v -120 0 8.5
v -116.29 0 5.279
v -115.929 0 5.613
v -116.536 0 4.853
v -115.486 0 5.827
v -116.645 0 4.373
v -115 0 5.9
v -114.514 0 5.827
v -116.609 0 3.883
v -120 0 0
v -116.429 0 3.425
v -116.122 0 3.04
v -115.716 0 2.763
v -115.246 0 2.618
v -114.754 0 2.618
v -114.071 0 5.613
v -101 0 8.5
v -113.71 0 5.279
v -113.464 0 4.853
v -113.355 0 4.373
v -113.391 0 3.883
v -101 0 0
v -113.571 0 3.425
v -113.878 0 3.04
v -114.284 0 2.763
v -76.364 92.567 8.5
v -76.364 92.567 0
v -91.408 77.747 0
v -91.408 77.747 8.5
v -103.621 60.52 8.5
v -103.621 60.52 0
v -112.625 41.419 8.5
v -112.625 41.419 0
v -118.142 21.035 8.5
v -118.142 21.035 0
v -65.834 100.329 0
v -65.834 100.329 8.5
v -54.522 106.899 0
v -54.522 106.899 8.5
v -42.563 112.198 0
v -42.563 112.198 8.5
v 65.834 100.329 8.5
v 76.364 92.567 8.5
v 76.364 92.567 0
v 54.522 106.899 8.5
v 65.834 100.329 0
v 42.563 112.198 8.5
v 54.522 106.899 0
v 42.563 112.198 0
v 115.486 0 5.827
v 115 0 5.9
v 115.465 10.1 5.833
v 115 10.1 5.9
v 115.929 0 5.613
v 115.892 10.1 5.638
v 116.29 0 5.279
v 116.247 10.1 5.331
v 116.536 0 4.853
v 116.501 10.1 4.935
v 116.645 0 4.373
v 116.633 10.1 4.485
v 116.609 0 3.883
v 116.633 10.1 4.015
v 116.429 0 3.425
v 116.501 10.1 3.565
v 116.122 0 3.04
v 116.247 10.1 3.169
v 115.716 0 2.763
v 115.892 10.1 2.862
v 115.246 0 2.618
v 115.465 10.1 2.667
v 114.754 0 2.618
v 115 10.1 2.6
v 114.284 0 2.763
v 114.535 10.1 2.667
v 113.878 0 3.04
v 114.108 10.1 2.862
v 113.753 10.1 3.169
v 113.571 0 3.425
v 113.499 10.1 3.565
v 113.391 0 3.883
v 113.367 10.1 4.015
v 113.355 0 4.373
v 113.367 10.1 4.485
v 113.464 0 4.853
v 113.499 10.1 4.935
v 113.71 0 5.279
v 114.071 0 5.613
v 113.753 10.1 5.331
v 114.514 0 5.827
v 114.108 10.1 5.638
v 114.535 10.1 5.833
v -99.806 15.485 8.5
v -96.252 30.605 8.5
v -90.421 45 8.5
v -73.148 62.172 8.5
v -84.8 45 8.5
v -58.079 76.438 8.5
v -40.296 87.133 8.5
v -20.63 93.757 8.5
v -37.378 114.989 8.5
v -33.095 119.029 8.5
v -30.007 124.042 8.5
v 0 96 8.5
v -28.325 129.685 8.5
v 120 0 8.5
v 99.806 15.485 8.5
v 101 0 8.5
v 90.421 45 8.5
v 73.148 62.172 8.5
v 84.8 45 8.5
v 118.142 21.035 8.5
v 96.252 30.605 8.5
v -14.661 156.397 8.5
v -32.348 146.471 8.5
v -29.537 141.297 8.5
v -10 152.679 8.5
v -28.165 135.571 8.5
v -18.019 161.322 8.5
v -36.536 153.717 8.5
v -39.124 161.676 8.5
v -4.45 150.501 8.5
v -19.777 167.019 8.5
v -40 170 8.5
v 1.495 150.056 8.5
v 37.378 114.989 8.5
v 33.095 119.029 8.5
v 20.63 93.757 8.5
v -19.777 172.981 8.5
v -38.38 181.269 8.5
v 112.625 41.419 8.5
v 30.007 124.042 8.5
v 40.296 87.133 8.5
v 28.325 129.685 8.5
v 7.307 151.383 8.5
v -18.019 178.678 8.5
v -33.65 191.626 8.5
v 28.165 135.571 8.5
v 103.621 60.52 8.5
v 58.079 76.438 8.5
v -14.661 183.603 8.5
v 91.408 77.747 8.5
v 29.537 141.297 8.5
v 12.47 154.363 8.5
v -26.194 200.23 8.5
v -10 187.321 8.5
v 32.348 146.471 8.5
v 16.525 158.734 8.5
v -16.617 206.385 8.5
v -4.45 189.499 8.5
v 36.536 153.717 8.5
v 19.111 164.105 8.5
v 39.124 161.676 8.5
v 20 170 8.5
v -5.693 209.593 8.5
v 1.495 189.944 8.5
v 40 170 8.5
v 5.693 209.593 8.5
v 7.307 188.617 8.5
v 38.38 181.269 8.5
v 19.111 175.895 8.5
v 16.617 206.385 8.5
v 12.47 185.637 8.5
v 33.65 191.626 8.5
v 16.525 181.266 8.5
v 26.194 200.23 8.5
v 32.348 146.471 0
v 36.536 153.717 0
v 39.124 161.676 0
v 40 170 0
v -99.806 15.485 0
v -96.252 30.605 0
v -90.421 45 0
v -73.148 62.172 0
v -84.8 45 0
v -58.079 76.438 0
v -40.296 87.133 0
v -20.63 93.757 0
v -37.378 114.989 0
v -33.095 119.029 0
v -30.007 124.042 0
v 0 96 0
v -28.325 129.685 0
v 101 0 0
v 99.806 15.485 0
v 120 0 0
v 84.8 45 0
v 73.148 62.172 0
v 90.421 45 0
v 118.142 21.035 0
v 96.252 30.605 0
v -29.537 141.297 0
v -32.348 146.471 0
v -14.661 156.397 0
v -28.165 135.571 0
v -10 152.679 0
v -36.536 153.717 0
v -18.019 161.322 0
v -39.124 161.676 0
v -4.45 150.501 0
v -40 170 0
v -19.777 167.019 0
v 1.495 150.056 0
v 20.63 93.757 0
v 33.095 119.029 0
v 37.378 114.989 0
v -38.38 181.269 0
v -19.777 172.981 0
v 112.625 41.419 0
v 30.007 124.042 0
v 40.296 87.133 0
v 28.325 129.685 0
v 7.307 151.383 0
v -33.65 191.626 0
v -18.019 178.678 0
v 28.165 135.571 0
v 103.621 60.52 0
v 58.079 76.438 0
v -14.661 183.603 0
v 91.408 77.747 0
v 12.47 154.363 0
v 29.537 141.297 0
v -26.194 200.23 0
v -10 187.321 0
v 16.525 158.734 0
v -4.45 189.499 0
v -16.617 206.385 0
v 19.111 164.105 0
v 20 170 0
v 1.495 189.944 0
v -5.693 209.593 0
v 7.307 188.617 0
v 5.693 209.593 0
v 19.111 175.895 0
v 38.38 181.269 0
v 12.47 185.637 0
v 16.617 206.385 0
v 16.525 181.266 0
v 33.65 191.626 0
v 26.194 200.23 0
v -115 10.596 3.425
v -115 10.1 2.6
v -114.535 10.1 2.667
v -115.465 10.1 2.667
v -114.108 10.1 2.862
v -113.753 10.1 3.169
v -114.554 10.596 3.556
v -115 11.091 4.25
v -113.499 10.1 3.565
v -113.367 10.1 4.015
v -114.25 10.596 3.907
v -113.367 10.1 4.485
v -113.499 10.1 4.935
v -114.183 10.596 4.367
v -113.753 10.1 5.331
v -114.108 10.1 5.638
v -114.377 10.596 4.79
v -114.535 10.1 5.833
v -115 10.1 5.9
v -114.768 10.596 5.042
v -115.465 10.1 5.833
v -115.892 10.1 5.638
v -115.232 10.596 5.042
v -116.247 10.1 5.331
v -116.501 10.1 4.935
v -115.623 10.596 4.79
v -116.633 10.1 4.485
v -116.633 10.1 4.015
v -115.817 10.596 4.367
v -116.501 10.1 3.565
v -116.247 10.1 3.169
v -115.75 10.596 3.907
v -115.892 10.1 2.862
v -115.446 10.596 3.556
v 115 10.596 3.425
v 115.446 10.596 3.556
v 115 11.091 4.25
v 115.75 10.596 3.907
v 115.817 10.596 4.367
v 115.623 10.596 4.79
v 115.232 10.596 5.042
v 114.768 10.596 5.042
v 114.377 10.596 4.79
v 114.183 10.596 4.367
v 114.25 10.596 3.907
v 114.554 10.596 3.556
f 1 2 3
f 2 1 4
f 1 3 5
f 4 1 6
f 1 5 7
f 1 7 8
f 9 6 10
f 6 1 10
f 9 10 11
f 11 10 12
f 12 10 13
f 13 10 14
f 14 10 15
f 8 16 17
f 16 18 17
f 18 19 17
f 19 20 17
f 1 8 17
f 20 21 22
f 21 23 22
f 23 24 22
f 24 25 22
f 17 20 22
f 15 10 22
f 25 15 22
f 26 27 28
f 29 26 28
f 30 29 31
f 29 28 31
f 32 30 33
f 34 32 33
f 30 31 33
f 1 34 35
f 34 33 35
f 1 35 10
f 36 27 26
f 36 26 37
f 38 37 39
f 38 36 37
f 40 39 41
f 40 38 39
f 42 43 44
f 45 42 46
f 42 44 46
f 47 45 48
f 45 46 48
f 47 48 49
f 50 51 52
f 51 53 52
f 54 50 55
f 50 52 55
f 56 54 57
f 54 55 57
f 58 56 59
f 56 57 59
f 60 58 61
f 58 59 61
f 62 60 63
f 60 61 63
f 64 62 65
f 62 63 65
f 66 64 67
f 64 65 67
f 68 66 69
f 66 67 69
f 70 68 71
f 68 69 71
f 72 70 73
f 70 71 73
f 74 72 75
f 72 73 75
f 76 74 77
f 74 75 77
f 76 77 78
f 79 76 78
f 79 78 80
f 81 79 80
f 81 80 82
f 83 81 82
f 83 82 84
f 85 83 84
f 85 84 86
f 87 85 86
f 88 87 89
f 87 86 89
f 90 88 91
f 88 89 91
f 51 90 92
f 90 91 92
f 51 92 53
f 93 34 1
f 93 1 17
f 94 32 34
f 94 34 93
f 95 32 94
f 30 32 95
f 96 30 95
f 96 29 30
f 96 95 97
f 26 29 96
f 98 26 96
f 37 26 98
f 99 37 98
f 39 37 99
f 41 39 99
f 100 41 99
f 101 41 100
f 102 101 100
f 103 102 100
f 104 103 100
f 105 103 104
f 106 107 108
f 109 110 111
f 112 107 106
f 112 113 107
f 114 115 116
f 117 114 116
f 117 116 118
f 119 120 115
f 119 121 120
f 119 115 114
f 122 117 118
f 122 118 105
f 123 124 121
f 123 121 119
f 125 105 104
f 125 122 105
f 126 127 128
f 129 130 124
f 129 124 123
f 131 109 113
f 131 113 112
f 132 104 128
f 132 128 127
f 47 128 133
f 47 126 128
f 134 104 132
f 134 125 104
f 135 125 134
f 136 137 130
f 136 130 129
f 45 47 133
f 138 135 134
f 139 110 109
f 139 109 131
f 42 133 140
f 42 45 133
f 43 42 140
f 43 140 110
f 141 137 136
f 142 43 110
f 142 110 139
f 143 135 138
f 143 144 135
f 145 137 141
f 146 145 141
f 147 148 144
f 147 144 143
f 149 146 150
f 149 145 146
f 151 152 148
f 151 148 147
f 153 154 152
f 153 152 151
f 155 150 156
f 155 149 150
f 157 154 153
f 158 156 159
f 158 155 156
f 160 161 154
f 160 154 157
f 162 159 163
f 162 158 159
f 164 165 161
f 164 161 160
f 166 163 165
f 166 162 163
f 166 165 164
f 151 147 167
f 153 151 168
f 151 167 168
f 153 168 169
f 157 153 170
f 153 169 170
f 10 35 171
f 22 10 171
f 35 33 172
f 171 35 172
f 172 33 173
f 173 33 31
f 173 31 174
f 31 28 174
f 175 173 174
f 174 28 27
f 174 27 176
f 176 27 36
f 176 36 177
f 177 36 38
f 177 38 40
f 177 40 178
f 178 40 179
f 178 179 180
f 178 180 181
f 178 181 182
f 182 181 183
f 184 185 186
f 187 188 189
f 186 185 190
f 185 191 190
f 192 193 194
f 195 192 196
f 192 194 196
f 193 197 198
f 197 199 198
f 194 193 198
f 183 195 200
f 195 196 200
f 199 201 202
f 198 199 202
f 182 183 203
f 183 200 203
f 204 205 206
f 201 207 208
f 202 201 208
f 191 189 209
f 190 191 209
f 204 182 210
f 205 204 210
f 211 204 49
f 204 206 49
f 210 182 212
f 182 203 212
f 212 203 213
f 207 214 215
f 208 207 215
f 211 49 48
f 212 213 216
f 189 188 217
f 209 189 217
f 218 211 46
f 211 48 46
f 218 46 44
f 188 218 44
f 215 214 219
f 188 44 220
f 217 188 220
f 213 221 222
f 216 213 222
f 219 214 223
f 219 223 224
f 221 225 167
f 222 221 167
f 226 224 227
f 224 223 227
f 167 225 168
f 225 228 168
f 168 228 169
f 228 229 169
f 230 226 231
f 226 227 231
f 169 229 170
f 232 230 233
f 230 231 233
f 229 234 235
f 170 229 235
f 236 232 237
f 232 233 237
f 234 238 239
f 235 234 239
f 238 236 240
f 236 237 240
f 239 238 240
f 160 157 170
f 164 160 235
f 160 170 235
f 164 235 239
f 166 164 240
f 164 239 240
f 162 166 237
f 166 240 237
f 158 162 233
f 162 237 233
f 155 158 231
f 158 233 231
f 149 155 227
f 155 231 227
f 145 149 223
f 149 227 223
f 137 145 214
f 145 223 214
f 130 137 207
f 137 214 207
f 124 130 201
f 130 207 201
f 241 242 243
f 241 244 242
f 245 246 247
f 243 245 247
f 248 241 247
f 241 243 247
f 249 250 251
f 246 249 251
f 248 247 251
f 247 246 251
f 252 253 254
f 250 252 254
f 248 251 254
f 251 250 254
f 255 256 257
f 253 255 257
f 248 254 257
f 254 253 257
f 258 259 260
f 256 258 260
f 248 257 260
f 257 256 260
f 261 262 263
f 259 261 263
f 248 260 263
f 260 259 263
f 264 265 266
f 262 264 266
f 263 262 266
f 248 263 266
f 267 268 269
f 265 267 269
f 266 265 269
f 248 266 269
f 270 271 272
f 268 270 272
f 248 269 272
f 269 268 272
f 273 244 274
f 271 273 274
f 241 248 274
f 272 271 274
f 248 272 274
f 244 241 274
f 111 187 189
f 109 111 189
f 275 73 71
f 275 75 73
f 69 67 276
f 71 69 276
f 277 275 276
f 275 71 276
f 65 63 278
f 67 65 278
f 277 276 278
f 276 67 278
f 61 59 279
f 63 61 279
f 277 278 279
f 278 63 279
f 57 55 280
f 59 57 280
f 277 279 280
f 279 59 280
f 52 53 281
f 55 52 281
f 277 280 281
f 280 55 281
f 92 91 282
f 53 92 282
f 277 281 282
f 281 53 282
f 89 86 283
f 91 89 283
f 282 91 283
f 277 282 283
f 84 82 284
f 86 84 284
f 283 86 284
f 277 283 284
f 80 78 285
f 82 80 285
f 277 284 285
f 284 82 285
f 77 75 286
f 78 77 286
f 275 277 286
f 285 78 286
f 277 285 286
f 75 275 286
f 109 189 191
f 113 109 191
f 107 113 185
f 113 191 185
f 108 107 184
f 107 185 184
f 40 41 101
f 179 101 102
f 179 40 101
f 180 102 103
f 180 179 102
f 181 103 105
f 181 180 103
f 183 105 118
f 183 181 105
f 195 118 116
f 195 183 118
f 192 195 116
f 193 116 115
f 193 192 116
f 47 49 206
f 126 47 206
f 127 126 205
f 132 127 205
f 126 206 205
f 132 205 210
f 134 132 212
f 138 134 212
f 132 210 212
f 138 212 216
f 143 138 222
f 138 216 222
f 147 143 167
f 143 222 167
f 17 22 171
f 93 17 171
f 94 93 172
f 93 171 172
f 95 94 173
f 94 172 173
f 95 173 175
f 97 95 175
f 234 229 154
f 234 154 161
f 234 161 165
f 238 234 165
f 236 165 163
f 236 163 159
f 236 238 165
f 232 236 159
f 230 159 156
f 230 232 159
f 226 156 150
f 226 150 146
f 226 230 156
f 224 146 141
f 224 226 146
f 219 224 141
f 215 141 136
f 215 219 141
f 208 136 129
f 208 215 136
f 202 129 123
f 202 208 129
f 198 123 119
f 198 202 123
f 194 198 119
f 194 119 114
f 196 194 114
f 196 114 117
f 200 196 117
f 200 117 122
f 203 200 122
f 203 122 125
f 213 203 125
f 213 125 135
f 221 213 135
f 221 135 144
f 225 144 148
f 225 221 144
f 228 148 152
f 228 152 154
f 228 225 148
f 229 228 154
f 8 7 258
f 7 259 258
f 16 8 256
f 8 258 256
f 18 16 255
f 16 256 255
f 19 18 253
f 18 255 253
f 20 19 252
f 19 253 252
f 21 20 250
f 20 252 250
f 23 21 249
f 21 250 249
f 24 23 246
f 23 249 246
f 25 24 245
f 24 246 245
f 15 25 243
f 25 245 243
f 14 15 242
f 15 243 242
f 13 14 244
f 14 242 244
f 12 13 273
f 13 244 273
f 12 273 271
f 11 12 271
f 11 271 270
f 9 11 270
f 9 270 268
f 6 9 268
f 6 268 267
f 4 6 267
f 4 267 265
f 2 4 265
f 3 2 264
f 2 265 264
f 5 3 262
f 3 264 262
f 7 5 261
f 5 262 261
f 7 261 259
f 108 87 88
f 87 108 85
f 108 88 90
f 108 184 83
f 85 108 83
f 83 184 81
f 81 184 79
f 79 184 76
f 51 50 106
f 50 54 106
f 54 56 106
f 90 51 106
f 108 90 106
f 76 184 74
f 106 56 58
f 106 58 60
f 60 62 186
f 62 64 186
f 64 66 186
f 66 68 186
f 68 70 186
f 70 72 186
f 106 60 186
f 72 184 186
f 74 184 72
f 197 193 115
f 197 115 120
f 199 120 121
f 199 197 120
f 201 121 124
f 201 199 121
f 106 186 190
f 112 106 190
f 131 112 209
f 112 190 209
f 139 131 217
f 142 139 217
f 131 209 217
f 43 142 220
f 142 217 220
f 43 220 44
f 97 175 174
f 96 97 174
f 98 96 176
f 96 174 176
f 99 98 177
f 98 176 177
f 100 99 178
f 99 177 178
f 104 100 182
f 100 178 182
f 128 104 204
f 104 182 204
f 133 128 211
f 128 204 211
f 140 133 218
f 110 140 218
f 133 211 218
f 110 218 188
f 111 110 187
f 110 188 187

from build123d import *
from build123d.topology import SkipClean

# Parameters (mm, degrees)
SKETCH_1_R             = 20
EXTRUDE_1_DEPTH        = 8.5
HOLE_WIZARD_M4_1_D     = 3.3
HOLE_WIZARD_M4_1_DEPTH = 10.1
HOLE_WIZARD_M4_1_TIP   = 0.991420021
CUT_EXTRUDE_START      = -10
CUT_EXTRUDE_1_DEPTH    = 10


with BuildPart() as part:
    # 草图1 → 凸台-拉伸1 (new body)
    with BuildSketch(Plane.XY):
        with BuildLine():
            Line((-40, 170), (-40, 169.705627485))
            ThreePointArc((-40, 169.705627485), (-49.546596627, 127.065484214), (-76.363636364, 92.566705901))
            ThreePointArc((-76.363636364, 92.566705901), (-108.544084048, 51.168171925), (-120, 0))
            Line((-120, 0), (-101, 0))
            ThreePointArc((-101, 0), (-98.319745933, 23.113363226), (-90.421236444, 45))
            Line((-90.421236444, 45), (-84.799764151, 45))
            ThreePointArc((-84.799764151, 45), (0, 96), (84.799764151, 45))
            Line((84.799764151, 45), (90.421236444, 45))
            ThreePointArc((90.421236444, 45), (98.319745933, 23.113363226), (101, 0))
            Line((101, 0), (120, 0))
            ThreePointArc((120, 0), (108.544084048, 51.168171925), (76.363636364, 92.566705901))
            ThreePointArc((76.363636364, 92.566705901), (49.546596627, 127.065484214), (40, 169.705627485))
            Line((40, 169.705627485), (40, 170))
            ThreePointArc((40, 170), (0, 210), (-40, 170))
        make_face()
        with Locations((0, 170)):
            Circle(SKETCH_1_R, mode=Mode.SUBTRACT)
    extrude(amount=EXTRUDE_1_DEPTH)

    # M4 螺纹孔1
    with Locations(Plane(origin=(-115, 0, 4.25), x_dir=(0, 0, -1), z_dir=(0, -1, 0))):
        with Locations((0, 0), (0, 230)):
            Hole(HOLE_WIZARD_M4_1_D / 2, depth=HOLE_WIZARD_M4_1_DEPTH)
            with Locations((0, 0, -(HOLE_WIZARD_M4_1_DEPTH + HOLE_WIZARD_M4_1_TIP / 2))):  # 118° drill point
                Cone(0, HOLE_WIZARD_M4_1_D / 2, HOLE_WIZARD_M4_1_TIP, mode=Mode.SUBTRACT)

    # 草图5 → 切除-拉伸1 (cut)
    with SkipClean():  # the faces are left unmerged after this step: merging them gives an invalid solid
        with BuildSketch(Plane.XY.offset(8.5).offset(CUT_EXTRUDE_START)):
            with BuildLine():
                Line((-40, 170), (-40, 169.705627485))
                ThreePointArc((-40, 169.705627485), (-49.546596627, 127.065484214), (-76.363636364, 92.566705901))
                ThreePointArc((-76.363636364, 92.566705901), (-60.26783628, 103.76795223), (-42.562622554, 112.198142415))
                ThreePointArc((-42.562622554, 112.198142415), (-28.980506646, 126.808479049), (-32.347593141, 146.470588235))
                ThreePointArc((-32.347593141, 146.470588235), (-38.038820471, 157.628737446), (-40, 170))
            make_face()
        cut_extrude_1 = extrude(amount=CUT_EXTRUDE_1_DEPTH, mode=Mode.SUBTRACT)

    # 镜向1: 切除-拉伸1 across plane
    with SkipClean():  # the faces are left unmerged after this step: merging them gives an invalid solid
        add(cut_extrude_1.mirror(Plane(origin=(0, 0, 0), x_dir=(0, 0, 1), z_dir=(1, 0, 0))), mode=Mode.SUBTRACT)


solid = part.part
